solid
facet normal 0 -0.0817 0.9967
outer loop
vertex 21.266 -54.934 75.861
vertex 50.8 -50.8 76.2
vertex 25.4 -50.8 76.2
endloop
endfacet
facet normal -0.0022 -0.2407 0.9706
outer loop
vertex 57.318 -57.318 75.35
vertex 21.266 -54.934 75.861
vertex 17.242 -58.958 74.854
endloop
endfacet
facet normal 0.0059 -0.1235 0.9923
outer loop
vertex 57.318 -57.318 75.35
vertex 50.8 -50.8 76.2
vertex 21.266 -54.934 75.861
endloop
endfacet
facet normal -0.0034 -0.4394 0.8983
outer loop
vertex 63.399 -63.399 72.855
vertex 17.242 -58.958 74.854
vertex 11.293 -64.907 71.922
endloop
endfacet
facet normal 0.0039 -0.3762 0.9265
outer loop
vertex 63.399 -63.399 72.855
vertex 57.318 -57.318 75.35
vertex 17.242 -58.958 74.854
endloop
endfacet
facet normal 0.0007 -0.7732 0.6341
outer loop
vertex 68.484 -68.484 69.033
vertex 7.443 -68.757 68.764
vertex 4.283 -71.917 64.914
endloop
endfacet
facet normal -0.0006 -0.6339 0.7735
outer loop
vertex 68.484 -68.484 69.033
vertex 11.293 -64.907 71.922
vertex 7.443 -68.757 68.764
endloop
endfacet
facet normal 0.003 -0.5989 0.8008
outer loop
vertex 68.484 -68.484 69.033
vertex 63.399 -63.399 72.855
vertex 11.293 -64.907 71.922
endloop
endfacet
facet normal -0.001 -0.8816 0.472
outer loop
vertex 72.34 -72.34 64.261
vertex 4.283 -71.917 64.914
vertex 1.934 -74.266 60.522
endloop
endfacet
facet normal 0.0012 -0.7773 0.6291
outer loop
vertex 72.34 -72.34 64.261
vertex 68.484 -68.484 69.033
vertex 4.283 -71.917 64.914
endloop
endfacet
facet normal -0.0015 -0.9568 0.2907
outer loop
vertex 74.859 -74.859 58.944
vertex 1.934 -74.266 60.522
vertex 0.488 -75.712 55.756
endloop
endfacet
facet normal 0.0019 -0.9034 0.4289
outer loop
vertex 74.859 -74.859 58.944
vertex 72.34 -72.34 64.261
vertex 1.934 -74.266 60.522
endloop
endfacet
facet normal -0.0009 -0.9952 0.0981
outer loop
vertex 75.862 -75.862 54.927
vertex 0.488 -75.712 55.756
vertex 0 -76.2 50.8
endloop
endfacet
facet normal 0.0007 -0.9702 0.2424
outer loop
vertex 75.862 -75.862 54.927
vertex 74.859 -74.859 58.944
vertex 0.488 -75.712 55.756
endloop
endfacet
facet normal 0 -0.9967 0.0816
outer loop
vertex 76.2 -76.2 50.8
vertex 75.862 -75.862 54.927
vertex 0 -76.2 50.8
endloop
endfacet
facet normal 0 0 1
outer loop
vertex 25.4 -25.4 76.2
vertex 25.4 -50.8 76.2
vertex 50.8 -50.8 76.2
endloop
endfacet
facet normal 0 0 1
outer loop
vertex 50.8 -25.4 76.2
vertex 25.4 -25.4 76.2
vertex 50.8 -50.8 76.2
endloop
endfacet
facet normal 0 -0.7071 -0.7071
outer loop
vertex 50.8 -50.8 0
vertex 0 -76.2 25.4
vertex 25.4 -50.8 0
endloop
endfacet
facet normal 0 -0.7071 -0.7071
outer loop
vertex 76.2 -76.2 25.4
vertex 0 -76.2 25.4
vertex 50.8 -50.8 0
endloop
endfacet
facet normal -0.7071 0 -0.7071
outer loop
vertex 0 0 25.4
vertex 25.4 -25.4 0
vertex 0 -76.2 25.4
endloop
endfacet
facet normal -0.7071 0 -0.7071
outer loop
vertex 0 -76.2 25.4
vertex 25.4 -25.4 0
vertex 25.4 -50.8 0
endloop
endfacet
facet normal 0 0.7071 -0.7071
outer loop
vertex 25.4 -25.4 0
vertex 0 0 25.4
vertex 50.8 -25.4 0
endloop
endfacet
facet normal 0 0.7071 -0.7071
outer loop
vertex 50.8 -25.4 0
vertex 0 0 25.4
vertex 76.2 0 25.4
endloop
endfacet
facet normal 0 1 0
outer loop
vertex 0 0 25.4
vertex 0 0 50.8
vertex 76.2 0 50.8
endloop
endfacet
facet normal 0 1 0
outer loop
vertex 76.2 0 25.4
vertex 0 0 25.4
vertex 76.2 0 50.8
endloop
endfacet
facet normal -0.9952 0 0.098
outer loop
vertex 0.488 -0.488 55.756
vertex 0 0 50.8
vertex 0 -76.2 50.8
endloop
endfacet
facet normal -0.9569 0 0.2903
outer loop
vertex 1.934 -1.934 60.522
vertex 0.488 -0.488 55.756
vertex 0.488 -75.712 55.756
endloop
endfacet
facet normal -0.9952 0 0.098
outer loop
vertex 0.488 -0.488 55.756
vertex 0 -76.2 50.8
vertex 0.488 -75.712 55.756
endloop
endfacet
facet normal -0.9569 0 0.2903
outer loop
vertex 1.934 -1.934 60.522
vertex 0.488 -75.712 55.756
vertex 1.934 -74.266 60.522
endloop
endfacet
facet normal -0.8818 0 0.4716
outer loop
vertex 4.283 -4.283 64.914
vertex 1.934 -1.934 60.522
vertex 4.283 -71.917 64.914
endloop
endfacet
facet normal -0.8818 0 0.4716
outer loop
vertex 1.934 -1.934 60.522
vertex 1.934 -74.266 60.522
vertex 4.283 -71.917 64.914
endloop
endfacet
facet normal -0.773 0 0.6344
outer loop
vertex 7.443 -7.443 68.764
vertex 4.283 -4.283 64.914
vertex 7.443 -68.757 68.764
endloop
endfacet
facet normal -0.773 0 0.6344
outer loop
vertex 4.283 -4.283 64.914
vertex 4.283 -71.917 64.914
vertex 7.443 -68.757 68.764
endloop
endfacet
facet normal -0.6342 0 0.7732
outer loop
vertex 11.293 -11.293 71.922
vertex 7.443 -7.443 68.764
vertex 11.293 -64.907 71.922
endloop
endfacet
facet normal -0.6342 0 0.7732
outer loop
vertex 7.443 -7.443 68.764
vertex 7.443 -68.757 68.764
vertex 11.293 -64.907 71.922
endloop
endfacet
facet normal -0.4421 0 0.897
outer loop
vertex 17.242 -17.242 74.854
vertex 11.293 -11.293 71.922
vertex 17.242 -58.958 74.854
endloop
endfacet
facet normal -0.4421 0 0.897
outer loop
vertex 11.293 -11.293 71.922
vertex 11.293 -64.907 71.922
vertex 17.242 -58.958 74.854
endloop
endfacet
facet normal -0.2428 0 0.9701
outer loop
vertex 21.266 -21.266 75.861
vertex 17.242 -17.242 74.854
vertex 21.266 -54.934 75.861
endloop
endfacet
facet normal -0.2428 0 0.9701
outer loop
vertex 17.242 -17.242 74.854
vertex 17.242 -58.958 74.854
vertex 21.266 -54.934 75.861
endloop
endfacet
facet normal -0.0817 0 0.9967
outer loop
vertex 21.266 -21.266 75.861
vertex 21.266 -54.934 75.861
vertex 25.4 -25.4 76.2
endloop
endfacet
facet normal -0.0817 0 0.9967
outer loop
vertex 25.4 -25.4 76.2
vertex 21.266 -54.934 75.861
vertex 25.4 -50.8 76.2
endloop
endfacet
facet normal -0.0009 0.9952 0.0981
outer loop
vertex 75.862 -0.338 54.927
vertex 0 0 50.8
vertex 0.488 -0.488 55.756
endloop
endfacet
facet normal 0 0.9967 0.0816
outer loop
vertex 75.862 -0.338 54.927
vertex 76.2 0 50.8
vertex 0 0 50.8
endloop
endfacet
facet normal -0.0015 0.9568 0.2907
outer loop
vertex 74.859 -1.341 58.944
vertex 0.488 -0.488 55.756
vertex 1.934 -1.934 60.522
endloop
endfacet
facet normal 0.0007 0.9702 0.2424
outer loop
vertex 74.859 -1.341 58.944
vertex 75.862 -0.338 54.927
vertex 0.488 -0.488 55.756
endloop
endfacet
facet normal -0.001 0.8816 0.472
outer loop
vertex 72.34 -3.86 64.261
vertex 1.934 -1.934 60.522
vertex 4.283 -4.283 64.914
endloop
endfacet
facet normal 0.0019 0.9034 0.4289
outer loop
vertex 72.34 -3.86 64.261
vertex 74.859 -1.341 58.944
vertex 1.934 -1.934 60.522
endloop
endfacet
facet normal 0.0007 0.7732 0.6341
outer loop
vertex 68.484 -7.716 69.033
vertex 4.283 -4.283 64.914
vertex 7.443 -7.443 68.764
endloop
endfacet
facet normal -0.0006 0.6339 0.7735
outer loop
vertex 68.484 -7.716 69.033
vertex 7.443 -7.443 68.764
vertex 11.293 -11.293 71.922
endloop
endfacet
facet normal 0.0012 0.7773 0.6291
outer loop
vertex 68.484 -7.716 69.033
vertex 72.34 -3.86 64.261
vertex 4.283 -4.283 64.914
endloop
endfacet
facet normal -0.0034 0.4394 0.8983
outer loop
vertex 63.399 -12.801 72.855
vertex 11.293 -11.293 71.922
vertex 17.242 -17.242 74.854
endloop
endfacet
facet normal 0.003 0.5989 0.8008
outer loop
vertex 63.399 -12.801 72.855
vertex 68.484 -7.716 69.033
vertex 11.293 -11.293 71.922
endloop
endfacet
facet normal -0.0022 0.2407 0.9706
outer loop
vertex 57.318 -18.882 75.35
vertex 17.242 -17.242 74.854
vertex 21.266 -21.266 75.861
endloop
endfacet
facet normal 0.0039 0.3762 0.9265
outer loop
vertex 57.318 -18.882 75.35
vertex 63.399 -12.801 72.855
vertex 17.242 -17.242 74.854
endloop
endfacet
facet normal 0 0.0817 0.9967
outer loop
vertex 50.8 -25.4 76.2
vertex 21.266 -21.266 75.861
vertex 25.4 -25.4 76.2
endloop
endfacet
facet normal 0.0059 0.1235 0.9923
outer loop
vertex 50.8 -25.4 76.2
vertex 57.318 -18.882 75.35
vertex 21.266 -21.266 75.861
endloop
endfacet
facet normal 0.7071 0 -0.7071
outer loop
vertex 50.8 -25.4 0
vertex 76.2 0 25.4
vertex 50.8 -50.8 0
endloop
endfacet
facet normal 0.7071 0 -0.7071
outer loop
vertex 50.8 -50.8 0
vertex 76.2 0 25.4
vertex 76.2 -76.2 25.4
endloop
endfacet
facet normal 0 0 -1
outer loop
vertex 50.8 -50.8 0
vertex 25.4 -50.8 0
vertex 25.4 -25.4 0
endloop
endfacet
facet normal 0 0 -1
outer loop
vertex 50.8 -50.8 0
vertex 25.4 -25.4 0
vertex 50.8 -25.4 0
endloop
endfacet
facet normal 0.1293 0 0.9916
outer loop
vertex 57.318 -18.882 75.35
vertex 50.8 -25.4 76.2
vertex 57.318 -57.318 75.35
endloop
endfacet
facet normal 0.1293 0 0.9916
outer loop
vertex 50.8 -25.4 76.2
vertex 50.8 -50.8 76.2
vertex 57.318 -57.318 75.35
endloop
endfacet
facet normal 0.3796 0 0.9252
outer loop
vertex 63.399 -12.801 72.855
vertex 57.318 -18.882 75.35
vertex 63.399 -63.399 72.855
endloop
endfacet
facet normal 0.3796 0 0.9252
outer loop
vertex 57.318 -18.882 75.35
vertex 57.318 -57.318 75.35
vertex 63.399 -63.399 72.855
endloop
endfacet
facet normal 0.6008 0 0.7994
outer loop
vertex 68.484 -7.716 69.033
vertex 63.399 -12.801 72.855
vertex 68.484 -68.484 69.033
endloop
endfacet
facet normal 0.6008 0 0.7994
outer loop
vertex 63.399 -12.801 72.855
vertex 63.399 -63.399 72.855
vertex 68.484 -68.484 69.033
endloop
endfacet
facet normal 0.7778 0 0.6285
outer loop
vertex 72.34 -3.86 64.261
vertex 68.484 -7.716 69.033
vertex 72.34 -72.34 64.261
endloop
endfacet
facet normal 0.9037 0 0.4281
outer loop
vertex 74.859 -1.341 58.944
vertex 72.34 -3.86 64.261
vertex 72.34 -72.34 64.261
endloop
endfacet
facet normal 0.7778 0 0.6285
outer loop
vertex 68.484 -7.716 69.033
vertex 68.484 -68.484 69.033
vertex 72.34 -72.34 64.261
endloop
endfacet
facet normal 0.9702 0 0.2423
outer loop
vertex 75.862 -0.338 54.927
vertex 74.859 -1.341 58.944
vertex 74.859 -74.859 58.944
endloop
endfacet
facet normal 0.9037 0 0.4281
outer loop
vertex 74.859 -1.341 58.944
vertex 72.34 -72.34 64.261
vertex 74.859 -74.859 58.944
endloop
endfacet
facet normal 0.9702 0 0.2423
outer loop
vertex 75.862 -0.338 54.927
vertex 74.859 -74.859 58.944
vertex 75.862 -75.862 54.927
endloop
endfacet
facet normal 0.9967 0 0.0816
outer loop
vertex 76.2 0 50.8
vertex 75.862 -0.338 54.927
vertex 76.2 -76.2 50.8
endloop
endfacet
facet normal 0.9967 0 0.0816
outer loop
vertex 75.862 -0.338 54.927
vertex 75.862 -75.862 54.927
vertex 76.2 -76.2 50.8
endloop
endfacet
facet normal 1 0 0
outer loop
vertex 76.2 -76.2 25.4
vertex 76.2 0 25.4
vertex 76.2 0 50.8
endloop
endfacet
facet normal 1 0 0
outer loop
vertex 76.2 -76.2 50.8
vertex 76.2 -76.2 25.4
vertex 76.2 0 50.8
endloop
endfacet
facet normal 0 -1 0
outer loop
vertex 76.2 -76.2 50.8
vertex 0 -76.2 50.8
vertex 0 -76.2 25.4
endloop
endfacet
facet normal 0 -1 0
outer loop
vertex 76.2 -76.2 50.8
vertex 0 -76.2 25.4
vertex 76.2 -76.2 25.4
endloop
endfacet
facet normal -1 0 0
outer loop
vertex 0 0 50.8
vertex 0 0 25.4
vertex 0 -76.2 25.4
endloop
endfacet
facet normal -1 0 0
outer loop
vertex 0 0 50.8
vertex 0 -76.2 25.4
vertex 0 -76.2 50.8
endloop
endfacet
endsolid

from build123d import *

# Parameters (mm, degrees)
F0_W     = 76.2
F0_H     = 76.2
F1_DEPTH = 76.2
F2_SIZE  = 25.4
F3_R     = 25.4


with BuildPart() as f1:
    # F0 (on Front) → F1 (new body)
    with BuildSketch(Plane.XZ):
        with Locations((38.1, 38.1)):
            Rectangle(F0_W, F0_H)
    extrude(amount=F1_DEPTH)

    # F2
    f2_edges = [f1.edges().sort_by_distance(p)[0] for p in [
        (0, -38.1, 0),
        (76.2, -38.1, 0),
        (38.1, 0, 0),
        (38.1, -76.2, 0),
    ]]
    chamfer(f2_edges, length=F2_SIZE)

    # F3
    f3_edges = [f1.edges().sort_by_distance(p)[0] for p in [
        (76.2, -38.1, 76.2),
        (0, -38.1, 76.2),
        (38.1, 0, 76.2),
        (38.1, -76.2, 76.2),
    ]]
    fillet(f3_edges, radius=F3_R)


solid = f1.part
